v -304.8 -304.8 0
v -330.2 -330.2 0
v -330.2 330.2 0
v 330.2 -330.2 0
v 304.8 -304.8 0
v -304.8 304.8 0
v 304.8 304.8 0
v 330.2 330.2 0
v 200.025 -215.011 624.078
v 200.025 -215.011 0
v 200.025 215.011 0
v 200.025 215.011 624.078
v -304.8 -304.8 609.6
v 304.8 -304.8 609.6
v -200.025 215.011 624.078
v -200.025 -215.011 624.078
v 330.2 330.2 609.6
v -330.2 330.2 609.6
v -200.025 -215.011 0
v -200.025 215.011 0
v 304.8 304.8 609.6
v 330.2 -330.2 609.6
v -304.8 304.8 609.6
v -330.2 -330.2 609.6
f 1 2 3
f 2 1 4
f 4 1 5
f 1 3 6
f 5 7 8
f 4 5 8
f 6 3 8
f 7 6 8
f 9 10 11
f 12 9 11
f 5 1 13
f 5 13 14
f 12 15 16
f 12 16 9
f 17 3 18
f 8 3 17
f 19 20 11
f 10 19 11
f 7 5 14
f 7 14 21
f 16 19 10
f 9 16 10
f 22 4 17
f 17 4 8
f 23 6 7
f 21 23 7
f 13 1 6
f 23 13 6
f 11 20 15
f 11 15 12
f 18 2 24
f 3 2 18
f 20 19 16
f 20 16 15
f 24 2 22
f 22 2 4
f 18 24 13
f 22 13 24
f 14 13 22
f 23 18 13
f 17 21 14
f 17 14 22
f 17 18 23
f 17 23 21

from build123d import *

# Parameters (mm, degrees)
F0_W     = 400.05
F0_H     = 430.022
F2_DEPTH = 624.078
F1_W     = 660.4
F1_H     = 660.4
F1_W_2   = 609.6
F1_H_2   = 609.6
F3_DEPTH = 609.6


with BuildPart() as f2:
    # F0 (on Top) → F2 (new body)
    with BuildSketch(Plane.XY):
        Rectangle(F0_W, F0_H)
    extrude(amount=F2_DEPTH)


with BuildPart() as f3:
    # F1 (on Top) → F3 (new body)
    with BuildSketch(Plane.XY):
        Rectangle(F1_W, F1_H)
        Rectangle(F1_W_2, F1_H_2, mode=Mode.SUBTRACT)
    extrude(amount=F3_DEPTH)


solid = Compound([f2.part, f3.part])
